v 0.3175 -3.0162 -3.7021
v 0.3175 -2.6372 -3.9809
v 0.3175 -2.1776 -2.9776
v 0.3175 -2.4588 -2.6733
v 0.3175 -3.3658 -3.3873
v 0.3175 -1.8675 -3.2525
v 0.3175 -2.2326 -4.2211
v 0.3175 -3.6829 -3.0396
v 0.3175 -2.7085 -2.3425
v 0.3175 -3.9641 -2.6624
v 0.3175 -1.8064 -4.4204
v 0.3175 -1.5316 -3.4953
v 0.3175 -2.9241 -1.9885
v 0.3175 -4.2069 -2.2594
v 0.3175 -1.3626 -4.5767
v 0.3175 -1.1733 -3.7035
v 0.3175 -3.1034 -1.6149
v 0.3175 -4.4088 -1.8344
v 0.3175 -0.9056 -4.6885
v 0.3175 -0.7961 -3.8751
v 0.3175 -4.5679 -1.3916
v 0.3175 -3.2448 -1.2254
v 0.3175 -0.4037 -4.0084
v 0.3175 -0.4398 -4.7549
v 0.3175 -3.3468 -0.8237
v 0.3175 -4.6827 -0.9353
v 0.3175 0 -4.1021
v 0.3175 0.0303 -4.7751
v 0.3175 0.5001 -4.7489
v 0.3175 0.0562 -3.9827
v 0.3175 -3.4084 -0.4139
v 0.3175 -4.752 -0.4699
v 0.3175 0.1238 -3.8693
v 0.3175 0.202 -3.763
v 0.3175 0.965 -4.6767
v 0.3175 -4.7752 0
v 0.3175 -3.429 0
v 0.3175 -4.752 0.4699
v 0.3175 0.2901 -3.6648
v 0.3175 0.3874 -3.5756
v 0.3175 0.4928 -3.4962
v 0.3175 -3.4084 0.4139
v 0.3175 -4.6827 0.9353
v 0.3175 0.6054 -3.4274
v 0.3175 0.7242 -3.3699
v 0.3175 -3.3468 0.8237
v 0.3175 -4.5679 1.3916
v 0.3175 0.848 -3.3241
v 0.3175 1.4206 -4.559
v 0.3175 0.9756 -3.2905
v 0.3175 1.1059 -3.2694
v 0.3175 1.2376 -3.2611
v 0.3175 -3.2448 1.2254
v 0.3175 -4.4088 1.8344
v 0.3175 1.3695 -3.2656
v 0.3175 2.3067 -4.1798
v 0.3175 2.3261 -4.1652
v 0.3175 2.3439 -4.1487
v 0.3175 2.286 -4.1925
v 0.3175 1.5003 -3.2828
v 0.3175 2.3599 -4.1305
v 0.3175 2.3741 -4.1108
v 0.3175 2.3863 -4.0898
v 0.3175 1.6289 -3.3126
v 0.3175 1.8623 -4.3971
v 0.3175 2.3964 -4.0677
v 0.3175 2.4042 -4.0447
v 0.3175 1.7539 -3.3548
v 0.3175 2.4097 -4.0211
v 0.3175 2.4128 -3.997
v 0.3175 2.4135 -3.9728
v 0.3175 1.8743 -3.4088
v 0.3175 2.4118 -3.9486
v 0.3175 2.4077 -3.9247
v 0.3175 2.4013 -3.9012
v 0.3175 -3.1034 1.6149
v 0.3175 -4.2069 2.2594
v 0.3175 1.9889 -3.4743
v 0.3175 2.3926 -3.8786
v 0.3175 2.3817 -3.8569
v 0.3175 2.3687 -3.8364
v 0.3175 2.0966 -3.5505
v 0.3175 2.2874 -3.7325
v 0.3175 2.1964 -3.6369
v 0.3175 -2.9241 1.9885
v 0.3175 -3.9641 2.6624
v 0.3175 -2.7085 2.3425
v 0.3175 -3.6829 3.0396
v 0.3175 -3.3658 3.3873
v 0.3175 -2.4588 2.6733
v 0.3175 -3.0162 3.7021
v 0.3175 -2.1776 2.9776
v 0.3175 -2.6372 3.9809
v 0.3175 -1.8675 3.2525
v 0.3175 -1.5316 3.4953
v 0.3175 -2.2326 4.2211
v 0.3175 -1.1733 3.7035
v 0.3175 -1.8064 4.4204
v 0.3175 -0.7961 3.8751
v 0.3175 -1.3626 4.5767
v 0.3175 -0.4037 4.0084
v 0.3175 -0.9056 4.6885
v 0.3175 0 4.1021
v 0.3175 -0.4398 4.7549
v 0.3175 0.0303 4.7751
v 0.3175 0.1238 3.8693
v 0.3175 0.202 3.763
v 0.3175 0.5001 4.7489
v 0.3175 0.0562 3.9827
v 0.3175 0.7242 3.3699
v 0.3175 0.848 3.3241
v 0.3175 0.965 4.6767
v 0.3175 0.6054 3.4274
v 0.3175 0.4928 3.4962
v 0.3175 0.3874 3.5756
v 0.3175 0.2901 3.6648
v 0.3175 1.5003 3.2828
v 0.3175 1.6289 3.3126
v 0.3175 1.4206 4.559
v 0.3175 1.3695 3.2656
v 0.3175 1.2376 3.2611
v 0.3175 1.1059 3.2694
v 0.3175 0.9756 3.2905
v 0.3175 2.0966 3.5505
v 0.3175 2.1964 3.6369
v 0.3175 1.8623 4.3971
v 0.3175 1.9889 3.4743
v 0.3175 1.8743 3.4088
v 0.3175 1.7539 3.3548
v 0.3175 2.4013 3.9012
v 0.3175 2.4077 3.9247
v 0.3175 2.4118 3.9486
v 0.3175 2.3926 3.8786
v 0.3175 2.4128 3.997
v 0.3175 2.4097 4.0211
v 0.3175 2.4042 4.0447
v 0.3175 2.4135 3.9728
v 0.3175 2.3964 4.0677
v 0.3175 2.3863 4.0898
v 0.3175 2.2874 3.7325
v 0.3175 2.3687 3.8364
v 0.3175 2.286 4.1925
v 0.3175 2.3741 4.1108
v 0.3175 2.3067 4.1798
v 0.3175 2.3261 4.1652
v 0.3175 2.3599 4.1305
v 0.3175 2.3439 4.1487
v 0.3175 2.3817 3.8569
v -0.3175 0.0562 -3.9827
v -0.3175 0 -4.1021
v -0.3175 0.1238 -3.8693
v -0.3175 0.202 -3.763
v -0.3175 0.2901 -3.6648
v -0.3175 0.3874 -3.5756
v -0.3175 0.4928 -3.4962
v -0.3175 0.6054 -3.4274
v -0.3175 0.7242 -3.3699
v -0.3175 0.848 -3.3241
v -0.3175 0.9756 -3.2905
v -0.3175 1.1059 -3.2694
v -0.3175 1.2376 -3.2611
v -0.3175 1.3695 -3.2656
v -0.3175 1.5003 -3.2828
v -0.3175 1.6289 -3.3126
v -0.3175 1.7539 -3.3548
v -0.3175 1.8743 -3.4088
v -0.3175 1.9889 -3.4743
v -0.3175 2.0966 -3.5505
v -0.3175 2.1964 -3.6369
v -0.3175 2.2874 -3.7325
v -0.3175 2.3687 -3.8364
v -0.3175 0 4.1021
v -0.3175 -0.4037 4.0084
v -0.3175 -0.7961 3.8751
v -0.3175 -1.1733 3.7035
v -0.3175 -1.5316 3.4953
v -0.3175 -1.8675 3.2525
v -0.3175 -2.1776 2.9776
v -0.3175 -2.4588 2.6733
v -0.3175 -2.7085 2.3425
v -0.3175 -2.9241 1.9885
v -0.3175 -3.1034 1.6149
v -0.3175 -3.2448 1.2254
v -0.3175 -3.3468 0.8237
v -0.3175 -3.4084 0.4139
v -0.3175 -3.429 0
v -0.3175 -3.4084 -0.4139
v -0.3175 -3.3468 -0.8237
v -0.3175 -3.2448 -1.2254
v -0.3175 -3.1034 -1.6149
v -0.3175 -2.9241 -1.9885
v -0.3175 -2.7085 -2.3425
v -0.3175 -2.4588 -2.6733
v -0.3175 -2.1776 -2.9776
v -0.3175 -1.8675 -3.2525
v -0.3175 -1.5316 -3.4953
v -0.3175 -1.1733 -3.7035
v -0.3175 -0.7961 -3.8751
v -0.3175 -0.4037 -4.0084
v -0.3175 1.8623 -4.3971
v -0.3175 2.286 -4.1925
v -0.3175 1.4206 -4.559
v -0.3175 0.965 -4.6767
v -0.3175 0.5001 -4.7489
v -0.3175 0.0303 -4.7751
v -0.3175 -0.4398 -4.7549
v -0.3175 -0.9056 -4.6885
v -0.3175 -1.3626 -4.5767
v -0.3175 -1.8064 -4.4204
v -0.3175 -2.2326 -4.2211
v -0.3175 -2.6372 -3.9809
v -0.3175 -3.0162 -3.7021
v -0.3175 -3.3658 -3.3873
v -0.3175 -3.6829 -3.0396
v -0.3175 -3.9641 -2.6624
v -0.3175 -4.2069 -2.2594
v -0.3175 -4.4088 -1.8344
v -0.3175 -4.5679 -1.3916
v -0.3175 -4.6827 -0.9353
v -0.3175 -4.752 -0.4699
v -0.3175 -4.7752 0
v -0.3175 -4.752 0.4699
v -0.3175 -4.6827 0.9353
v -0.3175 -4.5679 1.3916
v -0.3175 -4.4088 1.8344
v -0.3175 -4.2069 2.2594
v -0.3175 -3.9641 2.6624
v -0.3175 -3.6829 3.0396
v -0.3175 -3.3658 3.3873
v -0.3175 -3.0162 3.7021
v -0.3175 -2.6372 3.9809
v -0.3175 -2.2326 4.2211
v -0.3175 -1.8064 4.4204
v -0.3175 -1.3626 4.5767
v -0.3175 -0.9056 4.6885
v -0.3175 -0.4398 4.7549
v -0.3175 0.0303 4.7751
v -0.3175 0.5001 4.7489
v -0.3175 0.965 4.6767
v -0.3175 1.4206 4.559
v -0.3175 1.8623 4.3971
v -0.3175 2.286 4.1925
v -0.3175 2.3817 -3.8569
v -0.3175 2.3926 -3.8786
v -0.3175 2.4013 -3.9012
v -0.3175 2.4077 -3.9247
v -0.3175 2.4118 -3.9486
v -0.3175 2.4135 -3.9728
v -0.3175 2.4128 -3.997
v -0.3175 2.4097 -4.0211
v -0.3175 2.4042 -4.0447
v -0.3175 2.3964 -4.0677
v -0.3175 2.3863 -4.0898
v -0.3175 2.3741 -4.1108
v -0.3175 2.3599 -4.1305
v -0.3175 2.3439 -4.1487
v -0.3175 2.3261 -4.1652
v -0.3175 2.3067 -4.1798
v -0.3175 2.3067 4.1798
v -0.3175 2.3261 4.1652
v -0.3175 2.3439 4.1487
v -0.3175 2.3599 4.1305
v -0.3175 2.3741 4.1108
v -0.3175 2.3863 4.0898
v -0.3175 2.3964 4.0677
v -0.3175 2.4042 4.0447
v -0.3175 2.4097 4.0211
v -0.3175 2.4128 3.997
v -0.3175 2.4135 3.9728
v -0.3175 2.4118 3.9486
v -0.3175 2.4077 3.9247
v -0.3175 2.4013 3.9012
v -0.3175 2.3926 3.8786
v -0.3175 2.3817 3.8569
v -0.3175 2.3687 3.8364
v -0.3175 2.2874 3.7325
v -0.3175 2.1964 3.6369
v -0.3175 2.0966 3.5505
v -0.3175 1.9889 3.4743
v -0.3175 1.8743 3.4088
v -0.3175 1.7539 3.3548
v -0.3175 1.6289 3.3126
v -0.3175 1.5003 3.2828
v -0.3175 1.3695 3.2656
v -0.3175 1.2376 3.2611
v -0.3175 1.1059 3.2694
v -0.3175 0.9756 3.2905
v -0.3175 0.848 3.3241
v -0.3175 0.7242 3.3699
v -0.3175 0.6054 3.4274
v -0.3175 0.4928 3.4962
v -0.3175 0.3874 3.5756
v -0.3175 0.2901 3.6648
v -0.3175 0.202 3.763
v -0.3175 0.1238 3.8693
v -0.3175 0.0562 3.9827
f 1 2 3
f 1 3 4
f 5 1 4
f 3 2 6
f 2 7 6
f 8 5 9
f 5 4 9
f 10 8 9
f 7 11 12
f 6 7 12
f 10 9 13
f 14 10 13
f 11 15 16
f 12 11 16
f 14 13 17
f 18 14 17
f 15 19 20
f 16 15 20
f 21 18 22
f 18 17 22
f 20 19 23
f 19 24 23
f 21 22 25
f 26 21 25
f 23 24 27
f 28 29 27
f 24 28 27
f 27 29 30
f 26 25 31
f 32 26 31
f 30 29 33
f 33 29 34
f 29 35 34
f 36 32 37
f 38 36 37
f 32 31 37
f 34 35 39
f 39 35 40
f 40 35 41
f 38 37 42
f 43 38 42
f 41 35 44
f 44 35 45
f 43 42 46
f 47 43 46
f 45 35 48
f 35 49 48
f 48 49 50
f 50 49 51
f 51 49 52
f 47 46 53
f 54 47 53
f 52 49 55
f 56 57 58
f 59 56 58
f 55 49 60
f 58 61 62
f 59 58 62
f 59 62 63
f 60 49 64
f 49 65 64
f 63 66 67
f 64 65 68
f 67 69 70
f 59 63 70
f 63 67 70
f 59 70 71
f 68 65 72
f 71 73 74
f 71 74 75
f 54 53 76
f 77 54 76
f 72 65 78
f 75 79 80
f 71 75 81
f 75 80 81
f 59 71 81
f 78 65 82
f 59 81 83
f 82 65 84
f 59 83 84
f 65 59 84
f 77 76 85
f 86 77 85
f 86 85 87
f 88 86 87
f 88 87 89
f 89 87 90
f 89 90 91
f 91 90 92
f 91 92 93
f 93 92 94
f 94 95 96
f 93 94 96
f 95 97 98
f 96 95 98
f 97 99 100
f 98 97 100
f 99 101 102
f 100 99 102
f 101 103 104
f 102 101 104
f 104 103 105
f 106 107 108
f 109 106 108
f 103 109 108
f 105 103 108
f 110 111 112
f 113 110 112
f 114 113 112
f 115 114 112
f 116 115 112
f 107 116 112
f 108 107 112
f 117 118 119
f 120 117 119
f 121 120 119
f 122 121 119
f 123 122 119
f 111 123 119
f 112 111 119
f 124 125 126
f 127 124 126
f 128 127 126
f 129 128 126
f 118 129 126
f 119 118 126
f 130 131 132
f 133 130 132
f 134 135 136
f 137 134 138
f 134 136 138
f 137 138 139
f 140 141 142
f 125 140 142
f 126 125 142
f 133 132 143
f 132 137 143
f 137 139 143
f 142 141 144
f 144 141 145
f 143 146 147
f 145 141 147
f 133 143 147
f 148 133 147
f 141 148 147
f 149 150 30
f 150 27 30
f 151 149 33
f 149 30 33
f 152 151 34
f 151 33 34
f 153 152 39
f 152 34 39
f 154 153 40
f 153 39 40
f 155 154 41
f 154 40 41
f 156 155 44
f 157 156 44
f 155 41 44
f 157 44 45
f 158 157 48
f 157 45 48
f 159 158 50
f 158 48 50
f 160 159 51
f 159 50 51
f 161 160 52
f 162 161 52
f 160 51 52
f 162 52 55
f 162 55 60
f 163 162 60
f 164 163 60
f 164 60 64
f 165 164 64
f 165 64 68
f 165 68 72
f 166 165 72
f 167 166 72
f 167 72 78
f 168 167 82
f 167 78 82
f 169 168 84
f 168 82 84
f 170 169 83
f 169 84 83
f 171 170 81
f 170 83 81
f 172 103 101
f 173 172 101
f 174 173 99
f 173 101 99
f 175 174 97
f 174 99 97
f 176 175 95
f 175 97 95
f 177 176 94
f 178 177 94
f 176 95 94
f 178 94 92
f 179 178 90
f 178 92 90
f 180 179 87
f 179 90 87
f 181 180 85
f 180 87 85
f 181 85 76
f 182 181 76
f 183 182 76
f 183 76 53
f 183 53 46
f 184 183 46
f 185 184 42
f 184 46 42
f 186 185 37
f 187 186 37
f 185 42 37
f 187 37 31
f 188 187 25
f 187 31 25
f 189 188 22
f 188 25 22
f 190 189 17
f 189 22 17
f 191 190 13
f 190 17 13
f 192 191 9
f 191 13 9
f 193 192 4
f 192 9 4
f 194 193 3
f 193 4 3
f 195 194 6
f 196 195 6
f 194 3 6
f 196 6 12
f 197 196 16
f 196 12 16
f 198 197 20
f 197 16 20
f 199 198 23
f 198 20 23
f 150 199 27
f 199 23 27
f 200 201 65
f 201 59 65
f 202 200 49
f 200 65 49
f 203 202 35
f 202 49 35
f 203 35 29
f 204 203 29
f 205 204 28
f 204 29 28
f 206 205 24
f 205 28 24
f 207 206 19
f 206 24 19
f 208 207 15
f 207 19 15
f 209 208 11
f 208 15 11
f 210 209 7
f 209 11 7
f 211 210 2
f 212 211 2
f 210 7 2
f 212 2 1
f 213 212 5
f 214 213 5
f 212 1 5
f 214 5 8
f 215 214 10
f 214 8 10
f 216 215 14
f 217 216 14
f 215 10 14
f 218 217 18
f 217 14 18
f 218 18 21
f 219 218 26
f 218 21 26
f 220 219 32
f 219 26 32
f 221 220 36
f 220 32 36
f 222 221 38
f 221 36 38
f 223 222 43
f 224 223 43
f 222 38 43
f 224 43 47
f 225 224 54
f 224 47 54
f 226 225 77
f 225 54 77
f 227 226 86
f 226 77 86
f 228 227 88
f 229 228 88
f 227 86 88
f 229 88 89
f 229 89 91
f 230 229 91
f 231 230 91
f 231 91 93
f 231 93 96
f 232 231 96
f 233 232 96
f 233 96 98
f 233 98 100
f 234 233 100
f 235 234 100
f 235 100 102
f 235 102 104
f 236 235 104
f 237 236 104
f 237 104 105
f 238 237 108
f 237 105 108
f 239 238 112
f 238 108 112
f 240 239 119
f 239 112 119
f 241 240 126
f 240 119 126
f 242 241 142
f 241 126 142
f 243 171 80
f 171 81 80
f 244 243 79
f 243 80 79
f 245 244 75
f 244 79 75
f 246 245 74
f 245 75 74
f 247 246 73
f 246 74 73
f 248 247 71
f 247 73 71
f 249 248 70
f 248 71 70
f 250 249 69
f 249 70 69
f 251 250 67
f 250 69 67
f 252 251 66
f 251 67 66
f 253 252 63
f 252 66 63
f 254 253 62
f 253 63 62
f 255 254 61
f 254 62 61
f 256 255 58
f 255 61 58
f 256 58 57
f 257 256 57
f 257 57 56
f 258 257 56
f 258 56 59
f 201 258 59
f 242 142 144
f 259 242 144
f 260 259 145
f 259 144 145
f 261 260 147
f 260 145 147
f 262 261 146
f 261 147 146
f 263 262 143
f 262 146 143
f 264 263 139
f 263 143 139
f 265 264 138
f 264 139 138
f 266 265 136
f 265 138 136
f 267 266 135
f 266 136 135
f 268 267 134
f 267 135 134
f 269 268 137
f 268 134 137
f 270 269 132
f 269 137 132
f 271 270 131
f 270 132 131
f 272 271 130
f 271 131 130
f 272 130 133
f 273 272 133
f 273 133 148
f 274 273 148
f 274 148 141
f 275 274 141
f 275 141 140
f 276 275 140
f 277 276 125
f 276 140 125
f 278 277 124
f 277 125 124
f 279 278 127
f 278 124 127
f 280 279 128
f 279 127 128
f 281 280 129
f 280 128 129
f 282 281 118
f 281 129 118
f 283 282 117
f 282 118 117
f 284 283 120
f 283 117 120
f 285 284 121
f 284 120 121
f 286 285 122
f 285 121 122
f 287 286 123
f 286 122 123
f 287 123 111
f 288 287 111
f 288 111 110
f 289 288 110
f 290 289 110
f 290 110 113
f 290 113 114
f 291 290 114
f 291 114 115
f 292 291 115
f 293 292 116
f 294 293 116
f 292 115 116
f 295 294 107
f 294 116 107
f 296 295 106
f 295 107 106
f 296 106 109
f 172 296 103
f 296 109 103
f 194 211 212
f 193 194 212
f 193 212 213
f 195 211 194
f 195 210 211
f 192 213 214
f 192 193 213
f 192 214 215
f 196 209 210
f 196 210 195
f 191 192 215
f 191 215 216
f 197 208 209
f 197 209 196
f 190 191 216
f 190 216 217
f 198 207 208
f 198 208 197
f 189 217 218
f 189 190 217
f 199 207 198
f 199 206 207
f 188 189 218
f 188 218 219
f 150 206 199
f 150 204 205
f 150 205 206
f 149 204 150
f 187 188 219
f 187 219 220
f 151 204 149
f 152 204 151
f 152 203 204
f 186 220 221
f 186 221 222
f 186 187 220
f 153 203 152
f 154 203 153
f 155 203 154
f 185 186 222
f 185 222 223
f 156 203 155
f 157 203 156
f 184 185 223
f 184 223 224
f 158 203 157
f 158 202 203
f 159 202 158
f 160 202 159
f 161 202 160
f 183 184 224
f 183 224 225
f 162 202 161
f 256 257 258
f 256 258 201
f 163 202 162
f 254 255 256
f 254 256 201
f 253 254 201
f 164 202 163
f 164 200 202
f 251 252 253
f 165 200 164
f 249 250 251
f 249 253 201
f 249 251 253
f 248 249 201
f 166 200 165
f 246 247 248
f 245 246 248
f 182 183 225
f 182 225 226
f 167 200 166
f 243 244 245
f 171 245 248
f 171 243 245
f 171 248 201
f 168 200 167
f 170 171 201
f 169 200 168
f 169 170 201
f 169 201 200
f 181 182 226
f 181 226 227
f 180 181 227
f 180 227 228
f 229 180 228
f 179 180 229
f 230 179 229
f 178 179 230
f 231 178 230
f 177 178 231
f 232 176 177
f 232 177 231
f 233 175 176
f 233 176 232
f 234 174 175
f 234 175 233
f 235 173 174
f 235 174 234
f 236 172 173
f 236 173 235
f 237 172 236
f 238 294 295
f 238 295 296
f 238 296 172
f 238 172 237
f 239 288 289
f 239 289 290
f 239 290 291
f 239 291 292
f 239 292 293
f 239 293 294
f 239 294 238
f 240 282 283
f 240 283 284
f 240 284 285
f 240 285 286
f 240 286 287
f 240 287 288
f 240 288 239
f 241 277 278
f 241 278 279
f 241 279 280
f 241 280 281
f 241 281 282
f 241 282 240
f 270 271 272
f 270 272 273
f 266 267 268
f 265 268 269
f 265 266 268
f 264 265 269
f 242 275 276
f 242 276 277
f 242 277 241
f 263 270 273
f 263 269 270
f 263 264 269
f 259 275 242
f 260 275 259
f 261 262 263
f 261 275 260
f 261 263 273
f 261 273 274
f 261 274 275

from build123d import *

# Parameters (mm, degrees)
EXTRUDE1_DEPTH = 0.3175


with BuildPart() as part:
    # Sketch1 → Extrude1 (new body, symmetric)
    with BuildSketch(Plane(origin=(0, 0, 0), x_dir=(0, 0, -1), z_dir=(1, 0, 0))):
        with BuildLine():
            ThreePointArc((-4.1021, 0), (0, -3.429), (4.1021, 0))
            ThreePointArc((4.1021, 0), (3.269449594, 1.105861316), (3.836428871, 2.368703526))
            ThreePointArc((3.836428871, 2.368703526), (4.032995284, 2.407207291), (4.192462169, 2.286))
            ThreePointArc((4.192462169, 2.286), (0, -4.7752), (-4.192462169, 2.286))
            ThreePointArc((-4.192462169, 2.286), (-4.032995284, 2.407207291), (-3.836428871, 2.368703526))
            ThreePointArc((-3.836428871, 2.368703526), (-3.269449594, 1.105861316), (-4.1021, 0))
        make_face()
    extrude(amount=EXTRUDE1_DEPTH, both=True)


solid = part.part
